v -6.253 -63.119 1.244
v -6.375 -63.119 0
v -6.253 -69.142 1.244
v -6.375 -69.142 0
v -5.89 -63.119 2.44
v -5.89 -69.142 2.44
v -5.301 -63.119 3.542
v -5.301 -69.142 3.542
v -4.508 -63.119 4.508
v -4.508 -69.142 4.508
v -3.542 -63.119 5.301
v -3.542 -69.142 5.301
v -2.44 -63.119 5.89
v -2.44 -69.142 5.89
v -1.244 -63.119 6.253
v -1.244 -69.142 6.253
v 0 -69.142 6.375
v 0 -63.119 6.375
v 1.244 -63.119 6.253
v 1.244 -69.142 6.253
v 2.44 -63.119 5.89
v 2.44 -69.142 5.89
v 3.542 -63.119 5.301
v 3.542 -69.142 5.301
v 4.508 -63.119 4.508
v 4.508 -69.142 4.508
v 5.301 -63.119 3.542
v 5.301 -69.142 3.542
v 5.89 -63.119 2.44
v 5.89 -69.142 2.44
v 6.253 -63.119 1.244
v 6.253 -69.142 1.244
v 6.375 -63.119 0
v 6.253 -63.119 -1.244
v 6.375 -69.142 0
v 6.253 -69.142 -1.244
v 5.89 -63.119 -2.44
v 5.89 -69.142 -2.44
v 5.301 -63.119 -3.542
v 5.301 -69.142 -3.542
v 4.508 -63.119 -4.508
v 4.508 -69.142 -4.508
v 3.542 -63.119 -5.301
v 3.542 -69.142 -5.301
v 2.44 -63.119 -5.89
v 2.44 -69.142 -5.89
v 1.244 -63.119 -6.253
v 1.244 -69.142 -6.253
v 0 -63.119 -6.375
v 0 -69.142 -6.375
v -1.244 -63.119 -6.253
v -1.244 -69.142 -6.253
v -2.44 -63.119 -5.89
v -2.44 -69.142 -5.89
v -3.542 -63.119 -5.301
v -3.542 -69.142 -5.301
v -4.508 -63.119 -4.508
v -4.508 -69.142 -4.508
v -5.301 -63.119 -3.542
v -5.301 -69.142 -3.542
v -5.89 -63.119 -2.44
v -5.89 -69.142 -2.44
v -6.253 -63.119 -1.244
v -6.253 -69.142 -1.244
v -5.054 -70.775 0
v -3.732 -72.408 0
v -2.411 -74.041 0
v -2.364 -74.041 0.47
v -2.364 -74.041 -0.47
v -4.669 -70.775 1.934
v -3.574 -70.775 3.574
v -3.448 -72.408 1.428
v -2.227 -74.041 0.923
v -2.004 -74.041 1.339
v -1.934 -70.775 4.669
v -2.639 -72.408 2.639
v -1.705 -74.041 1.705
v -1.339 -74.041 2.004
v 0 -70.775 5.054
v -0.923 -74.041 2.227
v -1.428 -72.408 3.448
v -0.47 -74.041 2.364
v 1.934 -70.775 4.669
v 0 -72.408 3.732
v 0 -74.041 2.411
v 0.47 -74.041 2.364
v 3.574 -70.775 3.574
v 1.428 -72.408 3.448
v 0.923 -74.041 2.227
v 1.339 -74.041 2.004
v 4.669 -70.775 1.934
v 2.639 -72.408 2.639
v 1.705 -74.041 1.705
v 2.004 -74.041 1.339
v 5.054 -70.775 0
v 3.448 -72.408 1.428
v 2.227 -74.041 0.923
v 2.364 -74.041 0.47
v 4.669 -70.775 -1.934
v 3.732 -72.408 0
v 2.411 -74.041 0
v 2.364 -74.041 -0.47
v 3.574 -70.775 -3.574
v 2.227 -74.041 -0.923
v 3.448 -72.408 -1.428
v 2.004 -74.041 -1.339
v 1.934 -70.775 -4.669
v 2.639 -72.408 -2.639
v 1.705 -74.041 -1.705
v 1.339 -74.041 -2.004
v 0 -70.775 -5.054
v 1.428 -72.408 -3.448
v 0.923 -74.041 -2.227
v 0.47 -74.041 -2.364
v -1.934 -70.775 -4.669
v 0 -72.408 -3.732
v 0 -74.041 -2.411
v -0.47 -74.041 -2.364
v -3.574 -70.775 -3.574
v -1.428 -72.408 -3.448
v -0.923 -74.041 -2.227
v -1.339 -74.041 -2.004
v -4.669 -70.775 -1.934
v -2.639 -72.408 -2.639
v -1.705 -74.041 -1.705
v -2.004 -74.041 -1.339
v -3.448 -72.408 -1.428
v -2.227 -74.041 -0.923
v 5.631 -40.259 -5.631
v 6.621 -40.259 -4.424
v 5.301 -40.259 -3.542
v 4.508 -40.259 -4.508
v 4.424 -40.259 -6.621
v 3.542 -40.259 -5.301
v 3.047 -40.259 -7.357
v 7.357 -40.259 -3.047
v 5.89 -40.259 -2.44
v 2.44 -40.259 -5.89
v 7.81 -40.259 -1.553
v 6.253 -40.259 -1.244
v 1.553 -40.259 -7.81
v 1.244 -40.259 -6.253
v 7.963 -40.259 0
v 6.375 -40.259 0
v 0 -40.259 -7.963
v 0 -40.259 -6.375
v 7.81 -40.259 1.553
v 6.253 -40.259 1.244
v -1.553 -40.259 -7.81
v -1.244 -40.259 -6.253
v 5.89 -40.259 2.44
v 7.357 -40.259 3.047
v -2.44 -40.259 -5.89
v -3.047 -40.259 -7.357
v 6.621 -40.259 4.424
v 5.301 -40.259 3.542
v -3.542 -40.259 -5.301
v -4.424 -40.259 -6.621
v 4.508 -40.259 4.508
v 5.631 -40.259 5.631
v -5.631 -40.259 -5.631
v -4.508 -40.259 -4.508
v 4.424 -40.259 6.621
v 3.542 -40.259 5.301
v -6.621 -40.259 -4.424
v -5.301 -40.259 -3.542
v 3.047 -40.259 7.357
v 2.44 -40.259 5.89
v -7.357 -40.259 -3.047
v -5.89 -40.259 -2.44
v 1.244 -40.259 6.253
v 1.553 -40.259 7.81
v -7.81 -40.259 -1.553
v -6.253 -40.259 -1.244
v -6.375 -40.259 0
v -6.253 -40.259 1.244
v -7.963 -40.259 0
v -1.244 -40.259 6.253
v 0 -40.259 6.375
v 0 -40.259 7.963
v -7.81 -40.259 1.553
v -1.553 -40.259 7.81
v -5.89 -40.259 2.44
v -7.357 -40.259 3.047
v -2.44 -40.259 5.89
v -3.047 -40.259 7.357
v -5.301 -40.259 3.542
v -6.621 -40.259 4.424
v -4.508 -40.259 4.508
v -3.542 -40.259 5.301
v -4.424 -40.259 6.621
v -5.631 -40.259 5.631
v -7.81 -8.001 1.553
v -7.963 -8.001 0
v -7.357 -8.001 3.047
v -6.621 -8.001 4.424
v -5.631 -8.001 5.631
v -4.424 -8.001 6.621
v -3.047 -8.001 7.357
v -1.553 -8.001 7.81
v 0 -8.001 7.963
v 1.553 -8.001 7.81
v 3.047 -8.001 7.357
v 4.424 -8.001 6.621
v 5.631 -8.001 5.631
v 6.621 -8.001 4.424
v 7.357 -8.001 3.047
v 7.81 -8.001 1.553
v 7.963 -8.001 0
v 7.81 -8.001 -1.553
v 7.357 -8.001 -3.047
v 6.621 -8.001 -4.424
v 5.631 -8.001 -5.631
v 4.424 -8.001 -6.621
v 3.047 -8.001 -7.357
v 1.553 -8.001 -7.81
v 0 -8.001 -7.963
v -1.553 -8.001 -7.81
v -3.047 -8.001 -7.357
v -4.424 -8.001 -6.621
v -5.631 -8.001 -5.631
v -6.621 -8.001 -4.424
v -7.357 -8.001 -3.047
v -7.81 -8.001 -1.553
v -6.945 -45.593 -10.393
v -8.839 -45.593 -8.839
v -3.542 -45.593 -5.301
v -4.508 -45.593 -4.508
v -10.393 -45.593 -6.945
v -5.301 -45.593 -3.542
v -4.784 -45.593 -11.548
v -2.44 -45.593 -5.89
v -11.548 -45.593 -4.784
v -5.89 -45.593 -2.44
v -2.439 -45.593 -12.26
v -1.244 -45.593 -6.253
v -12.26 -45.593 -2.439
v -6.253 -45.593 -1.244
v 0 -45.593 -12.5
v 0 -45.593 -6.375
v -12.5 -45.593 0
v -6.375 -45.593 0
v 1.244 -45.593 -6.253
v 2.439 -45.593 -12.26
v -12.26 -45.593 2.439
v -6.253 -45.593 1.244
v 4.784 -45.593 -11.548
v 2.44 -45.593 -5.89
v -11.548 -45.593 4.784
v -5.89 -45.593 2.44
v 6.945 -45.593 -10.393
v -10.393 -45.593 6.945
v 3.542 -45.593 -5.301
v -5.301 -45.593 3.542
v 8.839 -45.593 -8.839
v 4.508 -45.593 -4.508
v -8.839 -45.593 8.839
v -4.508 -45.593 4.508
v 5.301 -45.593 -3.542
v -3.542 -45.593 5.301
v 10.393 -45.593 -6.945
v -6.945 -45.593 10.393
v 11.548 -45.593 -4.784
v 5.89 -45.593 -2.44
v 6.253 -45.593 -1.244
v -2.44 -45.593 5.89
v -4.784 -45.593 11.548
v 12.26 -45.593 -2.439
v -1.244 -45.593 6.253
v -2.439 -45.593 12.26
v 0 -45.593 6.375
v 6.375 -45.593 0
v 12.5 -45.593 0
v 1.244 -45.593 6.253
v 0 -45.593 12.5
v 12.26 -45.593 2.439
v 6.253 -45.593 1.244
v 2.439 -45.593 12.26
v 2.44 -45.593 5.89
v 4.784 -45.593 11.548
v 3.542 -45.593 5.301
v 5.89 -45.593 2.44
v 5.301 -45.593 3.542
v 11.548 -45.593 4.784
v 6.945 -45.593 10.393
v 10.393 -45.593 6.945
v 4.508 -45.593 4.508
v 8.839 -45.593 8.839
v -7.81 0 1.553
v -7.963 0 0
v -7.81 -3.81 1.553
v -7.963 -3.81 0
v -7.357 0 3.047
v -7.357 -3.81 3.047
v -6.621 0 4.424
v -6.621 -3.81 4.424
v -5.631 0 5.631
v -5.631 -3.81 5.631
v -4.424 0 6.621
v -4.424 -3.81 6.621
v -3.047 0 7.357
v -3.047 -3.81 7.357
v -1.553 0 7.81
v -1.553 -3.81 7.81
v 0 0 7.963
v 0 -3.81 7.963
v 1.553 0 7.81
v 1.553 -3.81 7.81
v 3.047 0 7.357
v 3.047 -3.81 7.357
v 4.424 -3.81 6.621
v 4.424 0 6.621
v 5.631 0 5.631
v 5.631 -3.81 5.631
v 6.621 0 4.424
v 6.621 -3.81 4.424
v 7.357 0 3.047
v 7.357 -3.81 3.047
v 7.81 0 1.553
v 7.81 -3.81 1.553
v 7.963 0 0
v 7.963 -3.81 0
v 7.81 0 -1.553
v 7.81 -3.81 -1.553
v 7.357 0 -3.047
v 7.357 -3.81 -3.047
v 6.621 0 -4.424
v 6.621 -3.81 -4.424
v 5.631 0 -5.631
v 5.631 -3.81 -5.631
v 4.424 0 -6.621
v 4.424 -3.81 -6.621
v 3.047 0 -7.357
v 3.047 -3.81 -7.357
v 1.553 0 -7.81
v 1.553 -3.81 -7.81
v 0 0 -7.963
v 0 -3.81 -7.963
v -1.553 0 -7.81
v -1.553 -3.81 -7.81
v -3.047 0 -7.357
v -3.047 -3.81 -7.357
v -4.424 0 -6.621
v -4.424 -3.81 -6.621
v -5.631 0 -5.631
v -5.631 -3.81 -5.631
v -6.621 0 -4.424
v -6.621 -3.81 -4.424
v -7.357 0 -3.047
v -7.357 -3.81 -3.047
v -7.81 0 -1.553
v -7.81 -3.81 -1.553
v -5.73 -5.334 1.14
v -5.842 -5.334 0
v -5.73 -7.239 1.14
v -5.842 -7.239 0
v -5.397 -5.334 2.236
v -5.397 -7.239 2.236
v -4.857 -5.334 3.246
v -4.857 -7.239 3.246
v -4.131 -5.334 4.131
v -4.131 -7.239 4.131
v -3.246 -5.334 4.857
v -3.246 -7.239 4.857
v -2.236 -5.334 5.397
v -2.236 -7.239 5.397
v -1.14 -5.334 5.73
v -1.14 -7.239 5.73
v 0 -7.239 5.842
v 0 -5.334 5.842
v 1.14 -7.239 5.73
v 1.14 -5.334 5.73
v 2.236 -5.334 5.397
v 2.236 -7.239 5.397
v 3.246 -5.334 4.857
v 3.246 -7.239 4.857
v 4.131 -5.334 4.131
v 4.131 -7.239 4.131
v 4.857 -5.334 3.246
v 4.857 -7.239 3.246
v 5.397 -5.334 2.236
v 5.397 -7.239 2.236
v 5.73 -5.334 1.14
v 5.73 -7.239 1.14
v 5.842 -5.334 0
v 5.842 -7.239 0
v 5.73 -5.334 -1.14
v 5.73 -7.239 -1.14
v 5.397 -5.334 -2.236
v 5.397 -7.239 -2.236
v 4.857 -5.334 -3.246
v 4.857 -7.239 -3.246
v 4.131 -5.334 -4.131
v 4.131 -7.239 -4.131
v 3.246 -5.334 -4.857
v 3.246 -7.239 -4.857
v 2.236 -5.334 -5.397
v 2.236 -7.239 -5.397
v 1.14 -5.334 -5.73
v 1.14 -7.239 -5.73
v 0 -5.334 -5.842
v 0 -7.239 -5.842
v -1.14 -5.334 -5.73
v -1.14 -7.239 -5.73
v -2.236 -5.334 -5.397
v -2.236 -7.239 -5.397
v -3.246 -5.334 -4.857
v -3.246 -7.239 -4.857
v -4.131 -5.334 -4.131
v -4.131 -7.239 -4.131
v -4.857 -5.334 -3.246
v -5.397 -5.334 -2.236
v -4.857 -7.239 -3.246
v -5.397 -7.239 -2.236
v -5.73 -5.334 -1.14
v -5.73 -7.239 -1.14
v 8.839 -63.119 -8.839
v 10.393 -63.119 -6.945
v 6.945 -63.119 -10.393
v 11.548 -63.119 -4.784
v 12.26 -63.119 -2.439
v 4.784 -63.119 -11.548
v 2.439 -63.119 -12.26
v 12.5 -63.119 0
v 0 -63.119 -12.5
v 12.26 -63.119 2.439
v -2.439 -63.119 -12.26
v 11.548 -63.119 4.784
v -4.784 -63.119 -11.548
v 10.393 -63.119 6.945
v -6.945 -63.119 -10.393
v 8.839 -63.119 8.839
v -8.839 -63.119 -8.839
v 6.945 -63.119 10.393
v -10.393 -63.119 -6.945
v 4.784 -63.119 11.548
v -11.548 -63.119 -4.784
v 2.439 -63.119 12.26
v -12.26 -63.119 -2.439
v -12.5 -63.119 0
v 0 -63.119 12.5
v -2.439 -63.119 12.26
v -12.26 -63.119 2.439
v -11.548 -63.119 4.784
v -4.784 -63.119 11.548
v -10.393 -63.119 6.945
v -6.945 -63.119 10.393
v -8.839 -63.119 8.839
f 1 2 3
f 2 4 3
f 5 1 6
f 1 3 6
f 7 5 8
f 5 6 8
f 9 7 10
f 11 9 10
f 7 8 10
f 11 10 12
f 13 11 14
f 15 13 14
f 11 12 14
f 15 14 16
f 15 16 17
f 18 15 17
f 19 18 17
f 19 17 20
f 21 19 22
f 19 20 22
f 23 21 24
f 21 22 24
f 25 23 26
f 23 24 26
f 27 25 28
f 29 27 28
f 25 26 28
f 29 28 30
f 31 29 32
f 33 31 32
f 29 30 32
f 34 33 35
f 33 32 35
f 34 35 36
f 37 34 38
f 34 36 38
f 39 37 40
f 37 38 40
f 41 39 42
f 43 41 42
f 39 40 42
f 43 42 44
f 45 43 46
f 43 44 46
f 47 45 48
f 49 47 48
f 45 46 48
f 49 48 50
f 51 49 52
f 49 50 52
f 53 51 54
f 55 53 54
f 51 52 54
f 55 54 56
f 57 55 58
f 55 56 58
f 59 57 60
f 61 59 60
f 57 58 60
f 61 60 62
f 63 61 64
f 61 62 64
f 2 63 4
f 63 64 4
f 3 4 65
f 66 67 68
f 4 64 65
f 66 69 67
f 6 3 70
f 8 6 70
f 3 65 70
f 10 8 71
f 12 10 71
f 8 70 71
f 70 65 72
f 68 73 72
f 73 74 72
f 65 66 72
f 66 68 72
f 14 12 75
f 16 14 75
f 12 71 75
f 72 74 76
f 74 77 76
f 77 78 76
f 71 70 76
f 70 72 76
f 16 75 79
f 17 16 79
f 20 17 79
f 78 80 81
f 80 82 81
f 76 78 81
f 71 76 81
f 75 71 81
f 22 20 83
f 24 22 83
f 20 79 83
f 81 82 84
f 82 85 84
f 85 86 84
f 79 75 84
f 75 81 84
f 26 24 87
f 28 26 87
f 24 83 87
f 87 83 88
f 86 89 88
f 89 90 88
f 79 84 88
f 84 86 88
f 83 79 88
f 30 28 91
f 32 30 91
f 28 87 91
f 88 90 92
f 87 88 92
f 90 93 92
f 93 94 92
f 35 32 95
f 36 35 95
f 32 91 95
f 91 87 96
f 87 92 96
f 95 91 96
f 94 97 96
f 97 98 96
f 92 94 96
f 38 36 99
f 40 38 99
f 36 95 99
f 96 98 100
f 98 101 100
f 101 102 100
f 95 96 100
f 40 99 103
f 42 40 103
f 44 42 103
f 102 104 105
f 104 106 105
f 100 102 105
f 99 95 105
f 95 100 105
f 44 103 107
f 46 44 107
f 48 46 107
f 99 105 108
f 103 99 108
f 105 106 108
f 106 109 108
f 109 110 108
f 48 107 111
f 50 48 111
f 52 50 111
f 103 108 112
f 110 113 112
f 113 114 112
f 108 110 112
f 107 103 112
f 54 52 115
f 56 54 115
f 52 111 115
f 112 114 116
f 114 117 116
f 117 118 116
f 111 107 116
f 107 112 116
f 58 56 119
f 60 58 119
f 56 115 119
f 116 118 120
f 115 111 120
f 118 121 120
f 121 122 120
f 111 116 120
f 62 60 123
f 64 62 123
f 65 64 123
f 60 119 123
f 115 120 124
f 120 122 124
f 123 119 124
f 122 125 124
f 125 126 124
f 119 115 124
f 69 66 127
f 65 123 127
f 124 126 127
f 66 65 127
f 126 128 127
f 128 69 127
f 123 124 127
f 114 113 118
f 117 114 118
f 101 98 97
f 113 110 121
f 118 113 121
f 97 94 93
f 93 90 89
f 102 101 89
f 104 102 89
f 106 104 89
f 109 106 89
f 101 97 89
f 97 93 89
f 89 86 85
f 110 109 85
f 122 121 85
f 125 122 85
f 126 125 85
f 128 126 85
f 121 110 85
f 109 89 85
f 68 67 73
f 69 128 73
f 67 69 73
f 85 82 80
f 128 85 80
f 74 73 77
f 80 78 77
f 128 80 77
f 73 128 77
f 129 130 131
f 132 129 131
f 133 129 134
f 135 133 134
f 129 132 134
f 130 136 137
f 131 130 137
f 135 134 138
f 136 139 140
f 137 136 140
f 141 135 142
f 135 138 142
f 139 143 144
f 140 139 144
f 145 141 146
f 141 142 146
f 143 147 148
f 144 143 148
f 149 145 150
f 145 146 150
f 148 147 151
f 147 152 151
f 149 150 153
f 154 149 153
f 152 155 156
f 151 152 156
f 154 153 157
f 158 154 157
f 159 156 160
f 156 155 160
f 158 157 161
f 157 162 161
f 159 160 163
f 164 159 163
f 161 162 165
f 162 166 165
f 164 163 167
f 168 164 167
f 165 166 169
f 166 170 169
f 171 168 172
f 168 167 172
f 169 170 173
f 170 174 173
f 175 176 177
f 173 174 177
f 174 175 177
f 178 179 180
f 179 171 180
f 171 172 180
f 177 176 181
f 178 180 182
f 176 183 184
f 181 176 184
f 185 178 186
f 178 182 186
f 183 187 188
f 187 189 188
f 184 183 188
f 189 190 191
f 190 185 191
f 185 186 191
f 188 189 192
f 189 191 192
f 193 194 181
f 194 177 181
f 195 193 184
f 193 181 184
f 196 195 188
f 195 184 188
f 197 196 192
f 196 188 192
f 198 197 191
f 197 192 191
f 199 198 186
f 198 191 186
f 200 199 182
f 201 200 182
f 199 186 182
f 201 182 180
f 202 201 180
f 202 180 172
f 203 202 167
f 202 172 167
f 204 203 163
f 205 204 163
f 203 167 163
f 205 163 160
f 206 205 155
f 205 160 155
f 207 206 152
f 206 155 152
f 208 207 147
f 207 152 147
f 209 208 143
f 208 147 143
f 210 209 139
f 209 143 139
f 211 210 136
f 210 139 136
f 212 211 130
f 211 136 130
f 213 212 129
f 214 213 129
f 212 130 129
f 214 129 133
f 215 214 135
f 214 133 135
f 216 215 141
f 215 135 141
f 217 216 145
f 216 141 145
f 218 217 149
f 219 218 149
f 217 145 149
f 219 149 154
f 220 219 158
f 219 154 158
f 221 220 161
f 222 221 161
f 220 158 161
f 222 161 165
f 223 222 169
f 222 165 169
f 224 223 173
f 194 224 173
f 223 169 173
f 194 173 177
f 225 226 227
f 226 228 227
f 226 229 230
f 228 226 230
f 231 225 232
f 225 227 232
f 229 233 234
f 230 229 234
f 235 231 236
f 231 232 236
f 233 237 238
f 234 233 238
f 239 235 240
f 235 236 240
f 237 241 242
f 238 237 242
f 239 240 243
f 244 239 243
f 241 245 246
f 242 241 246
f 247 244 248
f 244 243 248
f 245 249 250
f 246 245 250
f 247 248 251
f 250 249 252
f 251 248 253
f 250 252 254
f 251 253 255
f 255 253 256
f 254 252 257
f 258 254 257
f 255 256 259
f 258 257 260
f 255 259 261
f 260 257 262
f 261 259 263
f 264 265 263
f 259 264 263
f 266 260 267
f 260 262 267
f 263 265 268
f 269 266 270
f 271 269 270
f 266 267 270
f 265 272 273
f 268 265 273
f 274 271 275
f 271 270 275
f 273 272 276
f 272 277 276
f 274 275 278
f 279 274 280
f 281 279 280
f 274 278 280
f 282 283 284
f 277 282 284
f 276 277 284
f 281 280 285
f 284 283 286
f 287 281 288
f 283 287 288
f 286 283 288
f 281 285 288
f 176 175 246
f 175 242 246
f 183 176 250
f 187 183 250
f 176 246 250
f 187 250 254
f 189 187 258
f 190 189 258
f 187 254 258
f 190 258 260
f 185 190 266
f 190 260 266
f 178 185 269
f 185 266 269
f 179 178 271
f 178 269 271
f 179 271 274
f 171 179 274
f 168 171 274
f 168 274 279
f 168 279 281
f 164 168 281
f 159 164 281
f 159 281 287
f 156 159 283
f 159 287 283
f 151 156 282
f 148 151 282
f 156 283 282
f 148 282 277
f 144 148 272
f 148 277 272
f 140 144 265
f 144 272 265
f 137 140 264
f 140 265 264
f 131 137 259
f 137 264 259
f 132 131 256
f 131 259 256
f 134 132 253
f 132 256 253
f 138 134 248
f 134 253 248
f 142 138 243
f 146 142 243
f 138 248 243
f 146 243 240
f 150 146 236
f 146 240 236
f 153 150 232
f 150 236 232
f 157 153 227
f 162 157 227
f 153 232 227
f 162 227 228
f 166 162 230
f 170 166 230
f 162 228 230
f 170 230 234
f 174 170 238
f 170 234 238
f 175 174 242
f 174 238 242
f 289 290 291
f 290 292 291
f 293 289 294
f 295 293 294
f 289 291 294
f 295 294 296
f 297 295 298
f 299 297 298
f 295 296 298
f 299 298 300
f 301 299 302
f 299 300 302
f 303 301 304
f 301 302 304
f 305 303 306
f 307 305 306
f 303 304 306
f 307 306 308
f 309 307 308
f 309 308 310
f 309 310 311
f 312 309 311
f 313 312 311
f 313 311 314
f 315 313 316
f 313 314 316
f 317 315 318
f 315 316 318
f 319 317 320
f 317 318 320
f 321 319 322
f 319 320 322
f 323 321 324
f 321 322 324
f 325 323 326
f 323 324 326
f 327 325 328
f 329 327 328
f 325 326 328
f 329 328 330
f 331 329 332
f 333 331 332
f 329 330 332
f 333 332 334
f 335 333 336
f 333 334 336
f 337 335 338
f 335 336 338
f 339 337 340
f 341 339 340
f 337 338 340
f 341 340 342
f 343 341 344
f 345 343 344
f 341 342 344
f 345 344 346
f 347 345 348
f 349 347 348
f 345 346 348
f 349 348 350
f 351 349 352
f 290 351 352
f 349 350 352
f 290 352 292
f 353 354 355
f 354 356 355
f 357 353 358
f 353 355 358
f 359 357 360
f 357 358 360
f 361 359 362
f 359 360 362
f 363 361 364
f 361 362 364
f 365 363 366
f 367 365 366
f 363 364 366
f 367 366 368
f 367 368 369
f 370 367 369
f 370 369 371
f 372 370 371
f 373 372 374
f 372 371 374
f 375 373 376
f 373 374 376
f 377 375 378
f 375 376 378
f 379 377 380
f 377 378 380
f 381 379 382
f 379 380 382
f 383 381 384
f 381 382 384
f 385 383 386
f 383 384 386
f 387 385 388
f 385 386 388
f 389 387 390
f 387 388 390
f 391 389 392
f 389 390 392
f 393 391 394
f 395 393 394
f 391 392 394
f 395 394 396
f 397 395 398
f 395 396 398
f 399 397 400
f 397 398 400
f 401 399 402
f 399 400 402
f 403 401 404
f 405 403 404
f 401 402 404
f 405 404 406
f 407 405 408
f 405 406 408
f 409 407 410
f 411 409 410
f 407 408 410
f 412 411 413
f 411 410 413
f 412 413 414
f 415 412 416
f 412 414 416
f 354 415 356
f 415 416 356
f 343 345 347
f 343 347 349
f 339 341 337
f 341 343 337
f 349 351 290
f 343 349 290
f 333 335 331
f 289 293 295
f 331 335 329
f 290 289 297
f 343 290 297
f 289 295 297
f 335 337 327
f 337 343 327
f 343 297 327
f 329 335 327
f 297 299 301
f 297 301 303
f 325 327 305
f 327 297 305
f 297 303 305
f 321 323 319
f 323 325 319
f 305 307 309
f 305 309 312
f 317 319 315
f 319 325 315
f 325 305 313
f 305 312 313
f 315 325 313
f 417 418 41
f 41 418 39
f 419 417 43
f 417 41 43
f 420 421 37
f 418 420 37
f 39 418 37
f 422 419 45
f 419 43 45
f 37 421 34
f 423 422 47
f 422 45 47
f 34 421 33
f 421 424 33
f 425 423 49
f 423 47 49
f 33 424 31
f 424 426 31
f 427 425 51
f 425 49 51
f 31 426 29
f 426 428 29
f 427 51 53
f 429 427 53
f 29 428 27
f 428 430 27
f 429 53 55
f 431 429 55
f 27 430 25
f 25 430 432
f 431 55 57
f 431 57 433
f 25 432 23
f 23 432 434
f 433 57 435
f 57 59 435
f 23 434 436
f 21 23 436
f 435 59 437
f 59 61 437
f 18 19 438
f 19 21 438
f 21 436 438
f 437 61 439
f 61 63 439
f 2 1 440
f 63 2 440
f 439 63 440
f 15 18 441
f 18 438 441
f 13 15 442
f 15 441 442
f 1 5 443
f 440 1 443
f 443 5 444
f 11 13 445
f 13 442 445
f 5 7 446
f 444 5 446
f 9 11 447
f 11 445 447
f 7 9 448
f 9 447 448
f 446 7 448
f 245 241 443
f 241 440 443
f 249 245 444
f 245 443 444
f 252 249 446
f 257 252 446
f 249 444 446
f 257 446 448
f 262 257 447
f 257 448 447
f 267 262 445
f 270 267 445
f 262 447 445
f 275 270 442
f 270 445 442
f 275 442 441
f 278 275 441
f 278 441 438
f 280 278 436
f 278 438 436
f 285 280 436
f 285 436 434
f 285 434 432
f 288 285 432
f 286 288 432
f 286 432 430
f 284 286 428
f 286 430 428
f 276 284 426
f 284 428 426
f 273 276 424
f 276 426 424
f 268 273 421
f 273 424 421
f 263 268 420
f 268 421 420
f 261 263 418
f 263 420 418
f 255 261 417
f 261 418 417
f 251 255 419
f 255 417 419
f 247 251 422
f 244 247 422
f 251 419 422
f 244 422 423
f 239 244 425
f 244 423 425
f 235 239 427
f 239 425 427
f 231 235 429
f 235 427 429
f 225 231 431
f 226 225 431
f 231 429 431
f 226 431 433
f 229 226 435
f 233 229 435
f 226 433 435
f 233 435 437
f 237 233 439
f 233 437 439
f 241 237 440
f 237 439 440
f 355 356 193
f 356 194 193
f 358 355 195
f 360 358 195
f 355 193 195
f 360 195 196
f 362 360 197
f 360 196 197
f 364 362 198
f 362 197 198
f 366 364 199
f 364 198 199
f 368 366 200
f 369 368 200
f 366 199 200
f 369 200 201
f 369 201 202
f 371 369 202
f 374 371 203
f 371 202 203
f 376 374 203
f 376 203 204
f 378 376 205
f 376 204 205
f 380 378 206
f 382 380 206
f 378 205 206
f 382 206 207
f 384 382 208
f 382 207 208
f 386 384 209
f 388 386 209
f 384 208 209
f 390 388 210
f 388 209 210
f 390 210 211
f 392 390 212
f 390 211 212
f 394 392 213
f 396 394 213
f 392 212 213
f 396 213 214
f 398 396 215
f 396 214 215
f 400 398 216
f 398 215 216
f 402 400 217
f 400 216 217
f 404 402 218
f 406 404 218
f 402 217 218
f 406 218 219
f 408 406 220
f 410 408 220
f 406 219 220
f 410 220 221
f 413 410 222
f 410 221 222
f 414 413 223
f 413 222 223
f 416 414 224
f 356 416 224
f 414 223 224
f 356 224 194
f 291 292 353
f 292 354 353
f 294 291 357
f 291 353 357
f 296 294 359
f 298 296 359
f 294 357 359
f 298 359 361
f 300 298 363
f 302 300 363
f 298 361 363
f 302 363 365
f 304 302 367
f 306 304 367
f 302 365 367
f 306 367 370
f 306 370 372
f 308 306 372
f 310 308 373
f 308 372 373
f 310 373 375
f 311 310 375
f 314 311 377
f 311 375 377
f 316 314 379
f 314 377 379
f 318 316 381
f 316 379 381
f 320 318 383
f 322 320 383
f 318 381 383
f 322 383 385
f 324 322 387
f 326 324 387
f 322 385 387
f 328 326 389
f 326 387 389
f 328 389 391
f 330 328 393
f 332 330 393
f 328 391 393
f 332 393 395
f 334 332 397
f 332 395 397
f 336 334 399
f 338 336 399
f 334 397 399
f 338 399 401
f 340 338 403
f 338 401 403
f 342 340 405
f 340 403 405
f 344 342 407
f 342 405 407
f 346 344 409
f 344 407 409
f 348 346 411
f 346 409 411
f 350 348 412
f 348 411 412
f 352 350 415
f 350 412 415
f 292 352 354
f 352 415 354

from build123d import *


with BuildPart() as part:
    # Sketch1 → Revolve1 (revolve)
    with BuildSketch(Plane.XY):
        Polygon((0, 0), (-7.9629, 0), (-7.9629, -3.81), (-5.842, -5.334), (-5.842, -7.239), (-7.9629, -8.001), (-7.9629, -40.259), (-6.3754, -40.259), (-6.3754, -45.593), (-12.5, -45.593), (-12.5, -63.119), (-6.3754, -63.119), (-6.3754, -69.142247751), (-2.410616984, -74.041), (0, -74.041), align=None)
    revolve(axis=Axis((0, 0, 0), (0, 1, 0)))


solid = part.part
